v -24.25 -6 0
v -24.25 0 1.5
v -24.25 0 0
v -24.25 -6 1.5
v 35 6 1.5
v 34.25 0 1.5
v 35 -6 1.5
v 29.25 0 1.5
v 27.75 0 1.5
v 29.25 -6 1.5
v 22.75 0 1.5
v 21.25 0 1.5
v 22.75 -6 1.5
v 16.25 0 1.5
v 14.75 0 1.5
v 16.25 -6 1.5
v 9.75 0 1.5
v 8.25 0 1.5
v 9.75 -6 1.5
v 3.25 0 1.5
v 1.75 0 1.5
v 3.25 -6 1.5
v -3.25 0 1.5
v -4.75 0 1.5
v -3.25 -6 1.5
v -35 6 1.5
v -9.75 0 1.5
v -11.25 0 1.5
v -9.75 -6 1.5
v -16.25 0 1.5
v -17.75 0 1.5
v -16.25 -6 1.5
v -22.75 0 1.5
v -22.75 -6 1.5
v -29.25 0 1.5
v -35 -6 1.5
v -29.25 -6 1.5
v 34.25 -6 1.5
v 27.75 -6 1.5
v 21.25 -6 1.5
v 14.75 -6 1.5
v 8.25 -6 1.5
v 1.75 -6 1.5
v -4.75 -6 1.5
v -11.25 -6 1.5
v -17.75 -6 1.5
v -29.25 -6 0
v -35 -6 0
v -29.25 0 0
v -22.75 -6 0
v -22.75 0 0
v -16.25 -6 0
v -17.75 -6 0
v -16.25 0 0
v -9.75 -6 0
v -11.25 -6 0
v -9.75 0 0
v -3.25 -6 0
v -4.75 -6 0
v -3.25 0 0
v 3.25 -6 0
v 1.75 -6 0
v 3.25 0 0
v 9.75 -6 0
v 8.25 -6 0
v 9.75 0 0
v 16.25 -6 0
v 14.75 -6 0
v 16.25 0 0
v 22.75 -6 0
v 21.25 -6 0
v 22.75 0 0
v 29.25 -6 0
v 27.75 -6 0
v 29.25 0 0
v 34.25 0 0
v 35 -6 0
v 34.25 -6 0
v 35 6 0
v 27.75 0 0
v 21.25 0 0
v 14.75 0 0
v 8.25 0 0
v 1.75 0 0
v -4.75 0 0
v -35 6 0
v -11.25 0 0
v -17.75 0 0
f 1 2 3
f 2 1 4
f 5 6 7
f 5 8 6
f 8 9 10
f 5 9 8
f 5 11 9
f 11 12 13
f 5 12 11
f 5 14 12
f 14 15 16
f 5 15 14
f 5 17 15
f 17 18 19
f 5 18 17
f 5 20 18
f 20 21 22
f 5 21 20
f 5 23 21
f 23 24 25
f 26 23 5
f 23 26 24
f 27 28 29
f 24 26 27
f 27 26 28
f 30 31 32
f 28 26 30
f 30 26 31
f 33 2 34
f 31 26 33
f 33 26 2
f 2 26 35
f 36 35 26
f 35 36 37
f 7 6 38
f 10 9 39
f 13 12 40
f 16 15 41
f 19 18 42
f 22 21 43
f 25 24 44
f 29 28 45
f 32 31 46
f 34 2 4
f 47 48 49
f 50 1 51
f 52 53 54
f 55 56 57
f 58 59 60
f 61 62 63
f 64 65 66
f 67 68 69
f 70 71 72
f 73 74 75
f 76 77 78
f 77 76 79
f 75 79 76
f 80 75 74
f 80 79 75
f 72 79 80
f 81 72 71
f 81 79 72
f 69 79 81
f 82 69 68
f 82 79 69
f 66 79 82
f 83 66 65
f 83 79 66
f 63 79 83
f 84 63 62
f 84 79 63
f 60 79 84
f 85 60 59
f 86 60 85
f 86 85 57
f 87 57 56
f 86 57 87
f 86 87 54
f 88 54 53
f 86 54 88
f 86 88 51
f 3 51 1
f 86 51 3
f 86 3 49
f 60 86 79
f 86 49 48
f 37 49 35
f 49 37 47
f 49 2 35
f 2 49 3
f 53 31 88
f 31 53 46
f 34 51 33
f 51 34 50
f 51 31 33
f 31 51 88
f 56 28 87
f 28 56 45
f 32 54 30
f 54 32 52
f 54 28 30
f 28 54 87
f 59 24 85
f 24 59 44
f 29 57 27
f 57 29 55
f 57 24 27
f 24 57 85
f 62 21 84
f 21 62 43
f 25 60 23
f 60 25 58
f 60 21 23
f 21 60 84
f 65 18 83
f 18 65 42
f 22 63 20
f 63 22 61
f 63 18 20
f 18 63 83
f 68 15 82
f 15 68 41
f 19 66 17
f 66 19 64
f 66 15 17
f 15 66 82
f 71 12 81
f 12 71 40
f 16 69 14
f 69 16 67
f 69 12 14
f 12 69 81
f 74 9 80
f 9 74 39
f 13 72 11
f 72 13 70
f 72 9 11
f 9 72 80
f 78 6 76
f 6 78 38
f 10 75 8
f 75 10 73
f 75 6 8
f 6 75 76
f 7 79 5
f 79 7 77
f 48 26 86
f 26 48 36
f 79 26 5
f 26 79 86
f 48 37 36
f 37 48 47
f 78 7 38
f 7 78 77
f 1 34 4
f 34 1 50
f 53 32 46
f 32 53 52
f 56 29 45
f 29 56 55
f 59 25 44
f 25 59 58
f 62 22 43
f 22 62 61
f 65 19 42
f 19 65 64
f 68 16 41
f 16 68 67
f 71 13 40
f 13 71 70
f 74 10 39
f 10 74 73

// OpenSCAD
// 10-well comb for agarose gel casting
// Printed flat, teeth pointing up

$fn = 64;

// ---- Dimensions (mm) ----
spine_len    = 70;    // spine length (X)
spine_wid    = 12;    // spine width (Y)
plate_thk    = 1.5;   // plate thickness (Z)

tooth_count  = 10;    // number of teeth
tooth_w      = 5.0;   // tooth width (X)
tooth_len    = 12;    // tooth length into plate (Y)
tooth_gap    = 1.5;   // gap between teeth (X)

eps          = 0.5;   // cutter overshoot

total_tooth_w = tooth_count * tooth_w;

difference() {
    // Base plate
    translate([-spine_len/2, -spine_wid/2, 0])
        cube([spine_len, spine_wid, plate_thk]);

    // Teeth, centred on spine in X
    for (i = [0 : tooth_count - 1]) {
        x = (i - (tooth_count - 1)/2) * (tooth_w + tooth_gap);
        translate([x, -tooth_len, 0])
            cube([tooth_w, tooth_len, plate_thk]);
    }
}
